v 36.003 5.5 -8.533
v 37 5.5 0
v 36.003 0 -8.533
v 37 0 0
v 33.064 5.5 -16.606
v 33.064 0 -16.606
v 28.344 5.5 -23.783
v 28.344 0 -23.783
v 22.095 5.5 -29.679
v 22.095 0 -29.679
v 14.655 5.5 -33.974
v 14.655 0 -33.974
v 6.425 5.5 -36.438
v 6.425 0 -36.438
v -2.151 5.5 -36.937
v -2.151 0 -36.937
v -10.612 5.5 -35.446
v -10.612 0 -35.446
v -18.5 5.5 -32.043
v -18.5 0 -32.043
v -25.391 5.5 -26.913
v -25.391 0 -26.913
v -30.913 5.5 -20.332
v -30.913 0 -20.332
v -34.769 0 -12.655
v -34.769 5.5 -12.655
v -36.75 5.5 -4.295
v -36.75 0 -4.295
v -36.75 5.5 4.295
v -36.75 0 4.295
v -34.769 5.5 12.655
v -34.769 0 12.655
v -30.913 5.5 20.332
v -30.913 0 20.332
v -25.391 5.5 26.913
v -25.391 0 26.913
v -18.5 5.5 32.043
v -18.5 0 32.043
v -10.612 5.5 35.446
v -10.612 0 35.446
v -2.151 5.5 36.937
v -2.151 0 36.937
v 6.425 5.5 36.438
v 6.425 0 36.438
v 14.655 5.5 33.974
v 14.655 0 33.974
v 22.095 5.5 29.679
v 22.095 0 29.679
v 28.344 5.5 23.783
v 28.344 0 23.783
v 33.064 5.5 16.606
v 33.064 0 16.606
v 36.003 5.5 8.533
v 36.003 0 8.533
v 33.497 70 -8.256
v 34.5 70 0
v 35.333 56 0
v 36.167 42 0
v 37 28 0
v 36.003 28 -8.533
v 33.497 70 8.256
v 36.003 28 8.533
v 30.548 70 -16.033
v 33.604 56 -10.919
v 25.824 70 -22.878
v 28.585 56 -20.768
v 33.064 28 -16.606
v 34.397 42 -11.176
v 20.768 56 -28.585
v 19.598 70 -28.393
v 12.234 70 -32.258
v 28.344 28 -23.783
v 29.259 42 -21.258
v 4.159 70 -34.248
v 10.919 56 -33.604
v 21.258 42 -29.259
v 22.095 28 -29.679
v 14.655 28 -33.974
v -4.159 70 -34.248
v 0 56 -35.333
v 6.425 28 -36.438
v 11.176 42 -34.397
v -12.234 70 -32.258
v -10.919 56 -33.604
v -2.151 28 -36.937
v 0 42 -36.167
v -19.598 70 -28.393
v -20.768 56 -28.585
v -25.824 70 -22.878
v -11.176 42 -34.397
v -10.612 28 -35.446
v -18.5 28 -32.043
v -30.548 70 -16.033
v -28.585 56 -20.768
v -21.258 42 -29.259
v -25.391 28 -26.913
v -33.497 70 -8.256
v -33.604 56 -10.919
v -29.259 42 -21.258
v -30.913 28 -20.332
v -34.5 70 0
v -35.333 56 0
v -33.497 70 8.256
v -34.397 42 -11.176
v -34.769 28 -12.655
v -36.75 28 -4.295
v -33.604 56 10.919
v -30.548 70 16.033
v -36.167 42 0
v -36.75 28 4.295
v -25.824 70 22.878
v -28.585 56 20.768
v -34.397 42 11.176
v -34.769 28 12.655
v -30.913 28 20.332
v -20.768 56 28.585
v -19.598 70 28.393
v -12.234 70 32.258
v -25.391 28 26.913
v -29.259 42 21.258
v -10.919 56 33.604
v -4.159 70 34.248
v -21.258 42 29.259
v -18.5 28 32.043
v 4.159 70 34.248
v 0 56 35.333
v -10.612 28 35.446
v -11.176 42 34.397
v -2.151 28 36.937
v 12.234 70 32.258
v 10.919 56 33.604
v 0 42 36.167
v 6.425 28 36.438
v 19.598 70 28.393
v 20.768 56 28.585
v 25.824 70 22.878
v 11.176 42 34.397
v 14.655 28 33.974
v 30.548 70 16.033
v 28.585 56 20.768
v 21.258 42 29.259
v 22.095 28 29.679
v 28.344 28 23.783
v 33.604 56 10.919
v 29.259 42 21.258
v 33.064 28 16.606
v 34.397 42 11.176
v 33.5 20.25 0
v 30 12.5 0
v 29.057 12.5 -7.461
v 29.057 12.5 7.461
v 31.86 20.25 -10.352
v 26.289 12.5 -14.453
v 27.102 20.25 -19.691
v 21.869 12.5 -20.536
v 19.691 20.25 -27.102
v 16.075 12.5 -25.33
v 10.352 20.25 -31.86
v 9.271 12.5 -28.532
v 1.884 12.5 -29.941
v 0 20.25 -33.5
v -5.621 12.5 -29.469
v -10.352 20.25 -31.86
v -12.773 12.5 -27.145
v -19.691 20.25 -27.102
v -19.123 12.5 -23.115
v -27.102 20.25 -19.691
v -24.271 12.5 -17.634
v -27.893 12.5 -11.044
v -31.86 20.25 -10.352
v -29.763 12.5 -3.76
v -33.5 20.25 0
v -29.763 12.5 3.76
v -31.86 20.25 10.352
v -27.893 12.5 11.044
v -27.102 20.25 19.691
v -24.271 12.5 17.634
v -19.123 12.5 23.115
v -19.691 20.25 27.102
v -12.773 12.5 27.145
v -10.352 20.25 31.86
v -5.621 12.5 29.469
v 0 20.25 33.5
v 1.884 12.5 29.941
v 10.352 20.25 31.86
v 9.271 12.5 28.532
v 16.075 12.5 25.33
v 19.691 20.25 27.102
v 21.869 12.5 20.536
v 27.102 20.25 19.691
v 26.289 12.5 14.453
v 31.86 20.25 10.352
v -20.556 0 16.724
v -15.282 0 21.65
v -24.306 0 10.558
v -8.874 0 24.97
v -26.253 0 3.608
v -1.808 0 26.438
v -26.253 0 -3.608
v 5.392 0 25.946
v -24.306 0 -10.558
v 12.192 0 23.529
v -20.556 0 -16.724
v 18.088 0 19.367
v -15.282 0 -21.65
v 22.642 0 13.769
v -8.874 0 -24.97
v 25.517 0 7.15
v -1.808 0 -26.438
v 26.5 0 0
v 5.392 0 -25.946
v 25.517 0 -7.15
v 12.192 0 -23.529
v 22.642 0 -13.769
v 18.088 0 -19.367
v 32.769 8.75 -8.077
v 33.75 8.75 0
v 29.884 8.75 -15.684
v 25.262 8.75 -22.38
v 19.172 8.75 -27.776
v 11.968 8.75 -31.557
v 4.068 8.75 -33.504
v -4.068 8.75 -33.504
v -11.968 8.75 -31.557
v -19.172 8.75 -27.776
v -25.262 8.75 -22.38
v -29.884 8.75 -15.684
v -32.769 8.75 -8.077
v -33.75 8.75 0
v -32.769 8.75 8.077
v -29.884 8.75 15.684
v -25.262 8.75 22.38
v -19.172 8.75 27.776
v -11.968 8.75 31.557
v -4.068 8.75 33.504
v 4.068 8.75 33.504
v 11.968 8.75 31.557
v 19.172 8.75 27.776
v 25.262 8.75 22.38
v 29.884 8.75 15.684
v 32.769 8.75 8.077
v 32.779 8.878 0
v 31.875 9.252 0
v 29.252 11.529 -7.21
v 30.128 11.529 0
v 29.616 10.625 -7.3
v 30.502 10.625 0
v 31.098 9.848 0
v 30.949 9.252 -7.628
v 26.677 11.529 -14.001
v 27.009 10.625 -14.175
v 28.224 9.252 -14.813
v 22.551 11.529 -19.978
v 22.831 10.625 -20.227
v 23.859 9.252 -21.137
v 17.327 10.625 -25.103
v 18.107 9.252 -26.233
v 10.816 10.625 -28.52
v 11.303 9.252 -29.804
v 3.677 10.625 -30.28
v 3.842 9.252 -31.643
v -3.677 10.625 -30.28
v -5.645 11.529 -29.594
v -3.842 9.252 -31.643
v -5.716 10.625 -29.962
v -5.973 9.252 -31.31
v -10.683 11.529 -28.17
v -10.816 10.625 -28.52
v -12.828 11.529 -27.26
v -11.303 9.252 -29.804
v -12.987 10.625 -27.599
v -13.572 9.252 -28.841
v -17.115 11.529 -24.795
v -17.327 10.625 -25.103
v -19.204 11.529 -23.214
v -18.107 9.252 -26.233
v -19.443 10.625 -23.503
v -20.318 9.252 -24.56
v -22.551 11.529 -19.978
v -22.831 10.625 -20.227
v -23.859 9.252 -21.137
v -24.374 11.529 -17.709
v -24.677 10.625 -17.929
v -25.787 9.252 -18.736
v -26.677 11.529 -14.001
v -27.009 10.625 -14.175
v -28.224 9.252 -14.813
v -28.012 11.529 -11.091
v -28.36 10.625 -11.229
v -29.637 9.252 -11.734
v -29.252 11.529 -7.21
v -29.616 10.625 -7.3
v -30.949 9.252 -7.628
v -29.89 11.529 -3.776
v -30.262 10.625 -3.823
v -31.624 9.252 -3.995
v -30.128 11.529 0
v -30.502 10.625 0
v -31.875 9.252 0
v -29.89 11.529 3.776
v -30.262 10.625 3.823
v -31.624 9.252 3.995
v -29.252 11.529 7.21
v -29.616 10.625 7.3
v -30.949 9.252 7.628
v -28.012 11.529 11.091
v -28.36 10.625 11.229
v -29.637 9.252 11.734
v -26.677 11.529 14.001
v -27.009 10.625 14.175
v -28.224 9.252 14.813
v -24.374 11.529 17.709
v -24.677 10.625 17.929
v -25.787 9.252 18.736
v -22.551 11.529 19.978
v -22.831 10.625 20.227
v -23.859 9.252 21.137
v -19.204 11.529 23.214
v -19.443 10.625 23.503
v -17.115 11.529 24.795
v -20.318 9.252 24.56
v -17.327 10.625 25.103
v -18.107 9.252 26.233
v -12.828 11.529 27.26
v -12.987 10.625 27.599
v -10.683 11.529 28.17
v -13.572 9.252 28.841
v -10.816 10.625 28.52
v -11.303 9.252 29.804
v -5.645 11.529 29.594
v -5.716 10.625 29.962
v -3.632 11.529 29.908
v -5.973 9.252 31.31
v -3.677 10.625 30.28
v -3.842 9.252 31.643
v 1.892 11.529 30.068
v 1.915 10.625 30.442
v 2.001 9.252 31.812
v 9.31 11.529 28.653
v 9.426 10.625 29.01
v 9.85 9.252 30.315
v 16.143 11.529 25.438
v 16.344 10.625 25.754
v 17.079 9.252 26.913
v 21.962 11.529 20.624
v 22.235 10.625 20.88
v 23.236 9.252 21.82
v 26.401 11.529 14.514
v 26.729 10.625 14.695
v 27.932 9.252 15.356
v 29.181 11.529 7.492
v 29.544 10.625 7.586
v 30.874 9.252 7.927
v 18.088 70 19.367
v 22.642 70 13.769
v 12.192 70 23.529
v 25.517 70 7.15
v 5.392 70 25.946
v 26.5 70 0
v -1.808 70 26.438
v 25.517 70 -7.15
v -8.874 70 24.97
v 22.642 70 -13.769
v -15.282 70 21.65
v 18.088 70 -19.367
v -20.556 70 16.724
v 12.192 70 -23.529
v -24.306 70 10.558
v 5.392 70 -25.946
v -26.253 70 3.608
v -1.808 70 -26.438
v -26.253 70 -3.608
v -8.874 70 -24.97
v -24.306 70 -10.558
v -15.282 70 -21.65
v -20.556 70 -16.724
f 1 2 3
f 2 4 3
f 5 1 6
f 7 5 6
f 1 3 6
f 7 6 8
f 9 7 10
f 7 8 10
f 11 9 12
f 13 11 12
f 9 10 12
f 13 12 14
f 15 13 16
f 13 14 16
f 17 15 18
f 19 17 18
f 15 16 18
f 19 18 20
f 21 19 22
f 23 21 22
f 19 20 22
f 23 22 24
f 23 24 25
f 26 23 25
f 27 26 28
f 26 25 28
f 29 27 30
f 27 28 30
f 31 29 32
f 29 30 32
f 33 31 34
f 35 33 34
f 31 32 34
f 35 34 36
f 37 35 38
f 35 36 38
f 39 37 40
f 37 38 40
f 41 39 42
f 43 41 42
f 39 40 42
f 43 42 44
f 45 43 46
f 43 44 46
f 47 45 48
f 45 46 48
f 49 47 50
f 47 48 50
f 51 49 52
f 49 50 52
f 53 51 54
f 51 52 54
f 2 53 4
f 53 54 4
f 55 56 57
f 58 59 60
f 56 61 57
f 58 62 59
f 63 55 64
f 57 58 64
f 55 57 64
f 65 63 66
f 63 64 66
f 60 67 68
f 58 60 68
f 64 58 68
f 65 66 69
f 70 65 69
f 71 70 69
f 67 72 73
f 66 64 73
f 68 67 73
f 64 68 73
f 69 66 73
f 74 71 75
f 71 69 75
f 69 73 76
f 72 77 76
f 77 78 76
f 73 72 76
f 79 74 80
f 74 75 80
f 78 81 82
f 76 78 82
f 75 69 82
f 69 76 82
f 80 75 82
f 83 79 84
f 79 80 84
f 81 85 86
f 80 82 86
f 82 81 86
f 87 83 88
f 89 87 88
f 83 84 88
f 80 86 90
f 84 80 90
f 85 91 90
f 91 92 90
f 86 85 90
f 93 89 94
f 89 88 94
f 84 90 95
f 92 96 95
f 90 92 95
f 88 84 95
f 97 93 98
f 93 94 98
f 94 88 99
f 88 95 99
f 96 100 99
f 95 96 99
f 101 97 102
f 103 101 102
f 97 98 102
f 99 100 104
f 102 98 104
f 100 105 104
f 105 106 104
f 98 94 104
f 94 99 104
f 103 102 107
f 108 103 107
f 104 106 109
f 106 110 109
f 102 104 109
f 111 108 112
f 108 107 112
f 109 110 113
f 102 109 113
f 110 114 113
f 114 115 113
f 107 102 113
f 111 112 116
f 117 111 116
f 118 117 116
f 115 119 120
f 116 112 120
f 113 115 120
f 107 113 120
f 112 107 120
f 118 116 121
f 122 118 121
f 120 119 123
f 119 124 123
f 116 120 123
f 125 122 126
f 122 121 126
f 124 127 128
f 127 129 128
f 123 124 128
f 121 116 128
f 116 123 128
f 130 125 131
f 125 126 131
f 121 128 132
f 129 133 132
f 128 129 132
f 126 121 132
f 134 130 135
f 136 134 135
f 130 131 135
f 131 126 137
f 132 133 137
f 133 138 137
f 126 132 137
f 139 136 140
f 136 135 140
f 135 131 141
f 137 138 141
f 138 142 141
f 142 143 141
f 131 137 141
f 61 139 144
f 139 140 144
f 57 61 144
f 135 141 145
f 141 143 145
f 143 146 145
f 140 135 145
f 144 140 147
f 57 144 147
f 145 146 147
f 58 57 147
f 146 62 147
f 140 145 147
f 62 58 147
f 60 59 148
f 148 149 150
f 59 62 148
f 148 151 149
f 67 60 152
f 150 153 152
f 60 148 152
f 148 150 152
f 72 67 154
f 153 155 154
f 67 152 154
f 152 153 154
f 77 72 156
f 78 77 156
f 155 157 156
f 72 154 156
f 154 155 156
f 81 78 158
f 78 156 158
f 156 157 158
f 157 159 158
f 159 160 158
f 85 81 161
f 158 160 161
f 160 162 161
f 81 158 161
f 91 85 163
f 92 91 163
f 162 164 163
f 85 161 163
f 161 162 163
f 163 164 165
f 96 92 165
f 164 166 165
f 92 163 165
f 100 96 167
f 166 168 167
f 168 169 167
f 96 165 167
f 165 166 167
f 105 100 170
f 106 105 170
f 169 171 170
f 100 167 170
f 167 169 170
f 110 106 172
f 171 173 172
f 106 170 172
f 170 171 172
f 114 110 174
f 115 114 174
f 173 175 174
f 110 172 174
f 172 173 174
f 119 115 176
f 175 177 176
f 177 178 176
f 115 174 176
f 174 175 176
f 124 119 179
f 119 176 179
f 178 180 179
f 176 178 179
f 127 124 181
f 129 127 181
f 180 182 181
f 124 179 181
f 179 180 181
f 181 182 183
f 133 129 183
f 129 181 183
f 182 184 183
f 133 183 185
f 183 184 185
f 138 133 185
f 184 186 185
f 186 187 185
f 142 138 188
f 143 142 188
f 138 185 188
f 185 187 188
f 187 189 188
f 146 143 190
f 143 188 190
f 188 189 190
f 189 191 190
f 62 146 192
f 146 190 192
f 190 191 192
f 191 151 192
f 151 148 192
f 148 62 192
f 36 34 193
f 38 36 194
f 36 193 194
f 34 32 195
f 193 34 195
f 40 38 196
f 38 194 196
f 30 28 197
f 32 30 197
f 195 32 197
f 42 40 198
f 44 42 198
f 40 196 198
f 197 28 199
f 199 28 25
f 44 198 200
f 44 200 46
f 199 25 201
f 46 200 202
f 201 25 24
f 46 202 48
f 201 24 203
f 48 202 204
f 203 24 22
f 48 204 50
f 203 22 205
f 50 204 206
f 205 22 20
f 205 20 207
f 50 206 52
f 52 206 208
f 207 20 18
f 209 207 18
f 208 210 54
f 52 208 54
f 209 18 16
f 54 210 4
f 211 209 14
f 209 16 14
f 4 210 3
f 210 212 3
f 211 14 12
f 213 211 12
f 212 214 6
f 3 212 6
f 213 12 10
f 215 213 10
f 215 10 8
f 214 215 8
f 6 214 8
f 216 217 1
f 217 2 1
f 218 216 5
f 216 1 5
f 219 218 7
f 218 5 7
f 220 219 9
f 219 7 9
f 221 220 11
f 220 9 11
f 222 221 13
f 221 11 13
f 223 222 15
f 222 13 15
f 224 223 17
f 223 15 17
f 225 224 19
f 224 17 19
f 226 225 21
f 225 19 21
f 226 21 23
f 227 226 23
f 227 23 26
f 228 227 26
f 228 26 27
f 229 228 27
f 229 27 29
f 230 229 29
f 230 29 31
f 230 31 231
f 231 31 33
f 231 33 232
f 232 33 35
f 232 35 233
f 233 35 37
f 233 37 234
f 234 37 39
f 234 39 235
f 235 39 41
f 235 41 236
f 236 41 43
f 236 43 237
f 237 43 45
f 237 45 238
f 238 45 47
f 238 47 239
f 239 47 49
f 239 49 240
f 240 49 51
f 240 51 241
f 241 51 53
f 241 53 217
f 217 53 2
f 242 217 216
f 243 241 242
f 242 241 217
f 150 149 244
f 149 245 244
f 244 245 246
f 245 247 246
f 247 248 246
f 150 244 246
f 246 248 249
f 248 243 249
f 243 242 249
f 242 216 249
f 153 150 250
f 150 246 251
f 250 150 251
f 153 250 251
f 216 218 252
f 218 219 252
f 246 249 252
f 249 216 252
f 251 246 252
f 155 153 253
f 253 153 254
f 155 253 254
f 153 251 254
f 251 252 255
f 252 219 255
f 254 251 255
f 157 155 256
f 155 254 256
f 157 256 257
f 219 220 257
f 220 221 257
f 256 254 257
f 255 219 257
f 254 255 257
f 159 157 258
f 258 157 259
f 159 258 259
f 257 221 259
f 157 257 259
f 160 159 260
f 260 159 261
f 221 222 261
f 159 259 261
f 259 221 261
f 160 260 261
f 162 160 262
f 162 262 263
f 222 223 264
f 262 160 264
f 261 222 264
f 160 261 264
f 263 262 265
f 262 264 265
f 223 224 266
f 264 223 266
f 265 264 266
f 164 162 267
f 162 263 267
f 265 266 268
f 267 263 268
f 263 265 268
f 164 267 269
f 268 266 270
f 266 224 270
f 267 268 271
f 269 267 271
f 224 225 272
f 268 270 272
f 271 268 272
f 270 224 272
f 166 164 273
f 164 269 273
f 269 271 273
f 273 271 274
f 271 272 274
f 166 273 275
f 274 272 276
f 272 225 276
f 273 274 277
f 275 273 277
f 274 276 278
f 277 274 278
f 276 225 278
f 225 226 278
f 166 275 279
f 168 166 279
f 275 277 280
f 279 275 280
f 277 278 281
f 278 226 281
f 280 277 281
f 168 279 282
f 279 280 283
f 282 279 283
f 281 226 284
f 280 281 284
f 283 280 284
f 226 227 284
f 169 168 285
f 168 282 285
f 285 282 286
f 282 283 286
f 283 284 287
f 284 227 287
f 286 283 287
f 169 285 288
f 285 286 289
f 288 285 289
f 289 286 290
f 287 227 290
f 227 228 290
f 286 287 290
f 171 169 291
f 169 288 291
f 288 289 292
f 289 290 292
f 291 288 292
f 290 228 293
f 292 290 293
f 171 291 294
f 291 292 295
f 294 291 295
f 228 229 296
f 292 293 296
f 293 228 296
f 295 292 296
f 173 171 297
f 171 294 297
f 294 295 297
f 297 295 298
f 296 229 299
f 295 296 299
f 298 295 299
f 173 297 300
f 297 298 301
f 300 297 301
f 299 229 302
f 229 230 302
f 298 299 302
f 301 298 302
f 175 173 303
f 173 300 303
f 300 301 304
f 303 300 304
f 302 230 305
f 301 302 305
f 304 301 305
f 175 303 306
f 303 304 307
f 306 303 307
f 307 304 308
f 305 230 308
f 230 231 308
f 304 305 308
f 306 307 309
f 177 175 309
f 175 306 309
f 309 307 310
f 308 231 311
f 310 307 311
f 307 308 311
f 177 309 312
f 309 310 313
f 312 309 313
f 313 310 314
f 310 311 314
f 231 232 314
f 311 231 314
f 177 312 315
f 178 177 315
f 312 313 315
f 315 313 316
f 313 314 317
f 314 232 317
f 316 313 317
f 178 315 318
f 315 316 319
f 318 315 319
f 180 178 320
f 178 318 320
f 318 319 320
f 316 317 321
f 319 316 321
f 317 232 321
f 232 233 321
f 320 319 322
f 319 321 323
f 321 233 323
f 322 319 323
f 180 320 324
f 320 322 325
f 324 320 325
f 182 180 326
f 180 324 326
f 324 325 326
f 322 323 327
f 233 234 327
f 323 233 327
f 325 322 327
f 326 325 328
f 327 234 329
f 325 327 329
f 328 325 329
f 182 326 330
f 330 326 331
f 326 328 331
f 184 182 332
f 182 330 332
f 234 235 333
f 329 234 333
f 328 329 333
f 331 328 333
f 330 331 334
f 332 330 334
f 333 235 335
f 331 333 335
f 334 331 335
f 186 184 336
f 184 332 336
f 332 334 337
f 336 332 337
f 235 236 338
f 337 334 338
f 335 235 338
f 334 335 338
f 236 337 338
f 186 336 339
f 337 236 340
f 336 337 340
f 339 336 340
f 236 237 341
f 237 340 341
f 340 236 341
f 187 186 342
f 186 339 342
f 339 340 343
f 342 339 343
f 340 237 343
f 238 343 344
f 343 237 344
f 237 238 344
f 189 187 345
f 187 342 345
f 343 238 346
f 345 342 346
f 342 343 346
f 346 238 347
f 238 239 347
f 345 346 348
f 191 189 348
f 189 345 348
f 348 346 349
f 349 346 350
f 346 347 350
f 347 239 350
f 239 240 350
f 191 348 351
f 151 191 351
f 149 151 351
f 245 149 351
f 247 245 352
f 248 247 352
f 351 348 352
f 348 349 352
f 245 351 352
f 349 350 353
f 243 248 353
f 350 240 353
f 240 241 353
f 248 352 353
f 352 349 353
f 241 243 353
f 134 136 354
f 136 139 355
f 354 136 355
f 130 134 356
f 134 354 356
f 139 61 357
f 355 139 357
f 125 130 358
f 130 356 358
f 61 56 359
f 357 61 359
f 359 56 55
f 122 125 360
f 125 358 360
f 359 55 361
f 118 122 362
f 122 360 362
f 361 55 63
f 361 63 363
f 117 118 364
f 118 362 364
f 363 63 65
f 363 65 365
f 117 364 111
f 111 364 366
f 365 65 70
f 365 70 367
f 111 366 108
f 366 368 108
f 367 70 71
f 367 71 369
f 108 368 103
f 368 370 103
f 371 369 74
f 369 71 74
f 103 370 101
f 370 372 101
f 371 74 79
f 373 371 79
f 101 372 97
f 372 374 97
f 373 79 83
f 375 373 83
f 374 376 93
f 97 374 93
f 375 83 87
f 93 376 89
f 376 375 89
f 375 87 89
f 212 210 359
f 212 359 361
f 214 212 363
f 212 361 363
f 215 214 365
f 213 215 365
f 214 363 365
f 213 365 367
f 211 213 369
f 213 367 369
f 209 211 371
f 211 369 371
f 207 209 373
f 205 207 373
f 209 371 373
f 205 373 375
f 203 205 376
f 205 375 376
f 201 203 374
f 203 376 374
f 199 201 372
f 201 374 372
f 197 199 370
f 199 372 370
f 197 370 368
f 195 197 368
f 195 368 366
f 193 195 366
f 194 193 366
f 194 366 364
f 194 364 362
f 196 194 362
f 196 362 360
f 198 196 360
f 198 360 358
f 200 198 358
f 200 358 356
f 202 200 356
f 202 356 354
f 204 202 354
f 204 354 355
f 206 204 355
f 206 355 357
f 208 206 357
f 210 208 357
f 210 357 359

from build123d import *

# Parameters (mm, degrees)
SKETCH2_R               = 26.5
CUT_EXTRUDE1_DEPTH      = 1
CUT_EXTRUDE1_DEPTH_BACK = 71


with BuildPart() as part:
    # Sketch1 → Revolve1 (revolve)
    with BuildSketch(Plane.XY):
        with BuildLine():
            Line((0, 0), (0, 70))
            Line((0, 70), (34.5, 70))
            Line((34.5, 70), (37, 28))
            Line((37, 28), (30, 12.5))
            ThreePointArc((30, 12.5), (31.098349571, 9.848349571), (33.75, 8.75))
            Line((33.75, 8.75), (37, 5.5))
            Line((37, 5.5), (37, 0))
            Line((37, 0), (0, 0))
        make_face()
    revolve(axis=Axis((0, 0, 0), (0, 1, 0)))

    # Sketch2 → Cut-Extrude1 (cut, two sides)
    with BuildSketch(Plane(origin=(0, 70, 0), x_dir=(1, 0, 0), z_dir=(0, 1, 0))) as cut_extrude1_sk:
        Circle(SKETCH2_R)
    extrude(amount=CUT_EXTRUDE1_DEPTH, mode=Mode.SUBTRACT)
    extrude(cut_extrude1_sk.sketch, amount=-CUT_EXTRUDE1_DEPTH_BACK, mode=Mode.SUBTRACT)


solid = part.part
